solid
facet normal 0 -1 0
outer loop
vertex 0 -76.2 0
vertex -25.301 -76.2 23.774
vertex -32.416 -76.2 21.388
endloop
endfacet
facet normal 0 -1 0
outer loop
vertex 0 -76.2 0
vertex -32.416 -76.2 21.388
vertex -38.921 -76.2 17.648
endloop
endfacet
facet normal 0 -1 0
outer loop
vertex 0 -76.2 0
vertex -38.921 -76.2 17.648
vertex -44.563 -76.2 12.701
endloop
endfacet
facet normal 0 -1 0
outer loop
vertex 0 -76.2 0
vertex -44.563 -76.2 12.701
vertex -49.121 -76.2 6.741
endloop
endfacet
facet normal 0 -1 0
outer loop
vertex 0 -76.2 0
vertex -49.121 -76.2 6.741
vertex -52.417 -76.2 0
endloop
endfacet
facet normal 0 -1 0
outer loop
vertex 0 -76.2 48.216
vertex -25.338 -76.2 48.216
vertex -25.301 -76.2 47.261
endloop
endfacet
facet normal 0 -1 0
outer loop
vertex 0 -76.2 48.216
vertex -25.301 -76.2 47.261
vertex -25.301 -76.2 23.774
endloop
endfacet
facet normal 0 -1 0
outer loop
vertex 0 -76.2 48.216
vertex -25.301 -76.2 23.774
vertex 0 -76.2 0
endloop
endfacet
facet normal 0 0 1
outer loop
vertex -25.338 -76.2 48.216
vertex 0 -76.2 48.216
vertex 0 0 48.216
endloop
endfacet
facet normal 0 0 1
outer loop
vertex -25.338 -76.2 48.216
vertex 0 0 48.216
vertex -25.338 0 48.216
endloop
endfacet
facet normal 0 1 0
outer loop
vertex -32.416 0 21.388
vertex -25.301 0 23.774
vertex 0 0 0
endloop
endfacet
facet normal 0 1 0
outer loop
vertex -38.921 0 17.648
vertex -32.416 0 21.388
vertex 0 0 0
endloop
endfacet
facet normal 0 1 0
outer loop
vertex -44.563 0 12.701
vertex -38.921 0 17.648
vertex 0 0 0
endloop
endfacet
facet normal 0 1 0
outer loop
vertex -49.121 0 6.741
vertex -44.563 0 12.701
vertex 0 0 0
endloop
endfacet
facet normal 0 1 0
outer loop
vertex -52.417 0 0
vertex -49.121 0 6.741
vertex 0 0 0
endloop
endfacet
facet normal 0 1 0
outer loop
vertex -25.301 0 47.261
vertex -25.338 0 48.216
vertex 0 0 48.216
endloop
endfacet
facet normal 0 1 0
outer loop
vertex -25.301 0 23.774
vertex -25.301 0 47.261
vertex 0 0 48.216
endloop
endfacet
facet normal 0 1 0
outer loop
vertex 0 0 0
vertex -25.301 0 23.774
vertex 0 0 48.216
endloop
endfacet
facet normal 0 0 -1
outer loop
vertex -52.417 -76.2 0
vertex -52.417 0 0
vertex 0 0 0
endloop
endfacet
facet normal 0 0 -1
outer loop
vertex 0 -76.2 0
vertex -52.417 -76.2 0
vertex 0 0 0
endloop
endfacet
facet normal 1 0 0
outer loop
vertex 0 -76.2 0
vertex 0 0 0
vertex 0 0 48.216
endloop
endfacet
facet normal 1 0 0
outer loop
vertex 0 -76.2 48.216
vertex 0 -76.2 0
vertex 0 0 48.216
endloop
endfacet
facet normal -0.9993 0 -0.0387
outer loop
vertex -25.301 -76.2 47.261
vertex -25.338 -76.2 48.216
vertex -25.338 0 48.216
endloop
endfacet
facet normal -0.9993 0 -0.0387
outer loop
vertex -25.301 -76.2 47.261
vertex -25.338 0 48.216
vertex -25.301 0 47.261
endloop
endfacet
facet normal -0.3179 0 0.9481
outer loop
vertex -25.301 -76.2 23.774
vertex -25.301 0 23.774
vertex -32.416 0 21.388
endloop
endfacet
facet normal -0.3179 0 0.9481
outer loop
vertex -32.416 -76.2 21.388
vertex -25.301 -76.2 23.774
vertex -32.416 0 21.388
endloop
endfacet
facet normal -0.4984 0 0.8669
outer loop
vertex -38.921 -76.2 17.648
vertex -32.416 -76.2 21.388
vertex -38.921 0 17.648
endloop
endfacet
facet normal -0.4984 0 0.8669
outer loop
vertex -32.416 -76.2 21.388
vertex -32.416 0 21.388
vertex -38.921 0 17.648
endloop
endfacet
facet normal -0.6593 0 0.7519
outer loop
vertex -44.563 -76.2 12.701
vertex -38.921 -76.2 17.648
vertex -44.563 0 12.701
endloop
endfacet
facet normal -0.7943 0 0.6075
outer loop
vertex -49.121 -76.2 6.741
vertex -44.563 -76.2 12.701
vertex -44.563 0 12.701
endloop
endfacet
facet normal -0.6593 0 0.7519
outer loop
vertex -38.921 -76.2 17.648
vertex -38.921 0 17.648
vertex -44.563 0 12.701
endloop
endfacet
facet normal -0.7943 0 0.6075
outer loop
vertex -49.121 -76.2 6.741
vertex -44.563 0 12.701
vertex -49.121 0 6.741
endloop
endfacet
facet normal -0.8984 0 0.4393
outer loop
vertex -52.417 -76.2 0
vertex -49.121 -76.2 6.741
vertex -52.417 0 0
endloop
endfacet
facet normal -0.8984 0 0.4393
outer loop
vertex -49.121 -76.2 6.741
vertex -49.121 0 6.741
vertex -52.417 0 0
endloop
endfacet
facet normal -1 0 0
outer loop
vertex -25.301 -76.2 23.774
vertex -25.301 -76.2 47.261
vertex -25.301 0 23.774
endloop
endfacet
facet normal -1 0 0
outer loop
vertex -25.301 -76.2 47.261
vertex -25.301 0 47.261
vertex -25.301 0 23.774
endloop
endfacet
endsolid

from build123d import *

# Parameters (mm, degrees)
F1_DEPTH = 25.4
F2_DEPTH = 50.8


with BuildPart() as f1:
    # F0 (on Front) → F1 (new body)
    with BuildSketch(Plane.XZ):
        with BuildLine():
            Line((0, 0), (0, 48.2160523534))
            Line((0, 48.2160523534), (-25.3014918417, 47.261275351))
            Line((-25.3014918417, 47.261275351), (-25.3014918417, 23.7738545984))
            ThreePointArc((-25.3014918417, 23.7738545984), (-41.8645804006, 15.3146673523), (-52.4170547724, 0))
            Line((-52.4170547724, 0), (0, 0))
        make_face()
        Polygon((-25.3014918417, 47.261275351), (0, 48.2160523534), (-25.3375213031, 48.2160523534), align=None)
    extrude(amount=F1_DEPTH)

    # F2 (add): a face of the model
    f2_faces = [f1.faces().sort_by_distance(p)[0] for p in [
        (-18.7199477301, -25.4, 20.2252721756),
    ]]
    extrude(f2_faces, amount=F2_DEPTH)


solid = f1.part
